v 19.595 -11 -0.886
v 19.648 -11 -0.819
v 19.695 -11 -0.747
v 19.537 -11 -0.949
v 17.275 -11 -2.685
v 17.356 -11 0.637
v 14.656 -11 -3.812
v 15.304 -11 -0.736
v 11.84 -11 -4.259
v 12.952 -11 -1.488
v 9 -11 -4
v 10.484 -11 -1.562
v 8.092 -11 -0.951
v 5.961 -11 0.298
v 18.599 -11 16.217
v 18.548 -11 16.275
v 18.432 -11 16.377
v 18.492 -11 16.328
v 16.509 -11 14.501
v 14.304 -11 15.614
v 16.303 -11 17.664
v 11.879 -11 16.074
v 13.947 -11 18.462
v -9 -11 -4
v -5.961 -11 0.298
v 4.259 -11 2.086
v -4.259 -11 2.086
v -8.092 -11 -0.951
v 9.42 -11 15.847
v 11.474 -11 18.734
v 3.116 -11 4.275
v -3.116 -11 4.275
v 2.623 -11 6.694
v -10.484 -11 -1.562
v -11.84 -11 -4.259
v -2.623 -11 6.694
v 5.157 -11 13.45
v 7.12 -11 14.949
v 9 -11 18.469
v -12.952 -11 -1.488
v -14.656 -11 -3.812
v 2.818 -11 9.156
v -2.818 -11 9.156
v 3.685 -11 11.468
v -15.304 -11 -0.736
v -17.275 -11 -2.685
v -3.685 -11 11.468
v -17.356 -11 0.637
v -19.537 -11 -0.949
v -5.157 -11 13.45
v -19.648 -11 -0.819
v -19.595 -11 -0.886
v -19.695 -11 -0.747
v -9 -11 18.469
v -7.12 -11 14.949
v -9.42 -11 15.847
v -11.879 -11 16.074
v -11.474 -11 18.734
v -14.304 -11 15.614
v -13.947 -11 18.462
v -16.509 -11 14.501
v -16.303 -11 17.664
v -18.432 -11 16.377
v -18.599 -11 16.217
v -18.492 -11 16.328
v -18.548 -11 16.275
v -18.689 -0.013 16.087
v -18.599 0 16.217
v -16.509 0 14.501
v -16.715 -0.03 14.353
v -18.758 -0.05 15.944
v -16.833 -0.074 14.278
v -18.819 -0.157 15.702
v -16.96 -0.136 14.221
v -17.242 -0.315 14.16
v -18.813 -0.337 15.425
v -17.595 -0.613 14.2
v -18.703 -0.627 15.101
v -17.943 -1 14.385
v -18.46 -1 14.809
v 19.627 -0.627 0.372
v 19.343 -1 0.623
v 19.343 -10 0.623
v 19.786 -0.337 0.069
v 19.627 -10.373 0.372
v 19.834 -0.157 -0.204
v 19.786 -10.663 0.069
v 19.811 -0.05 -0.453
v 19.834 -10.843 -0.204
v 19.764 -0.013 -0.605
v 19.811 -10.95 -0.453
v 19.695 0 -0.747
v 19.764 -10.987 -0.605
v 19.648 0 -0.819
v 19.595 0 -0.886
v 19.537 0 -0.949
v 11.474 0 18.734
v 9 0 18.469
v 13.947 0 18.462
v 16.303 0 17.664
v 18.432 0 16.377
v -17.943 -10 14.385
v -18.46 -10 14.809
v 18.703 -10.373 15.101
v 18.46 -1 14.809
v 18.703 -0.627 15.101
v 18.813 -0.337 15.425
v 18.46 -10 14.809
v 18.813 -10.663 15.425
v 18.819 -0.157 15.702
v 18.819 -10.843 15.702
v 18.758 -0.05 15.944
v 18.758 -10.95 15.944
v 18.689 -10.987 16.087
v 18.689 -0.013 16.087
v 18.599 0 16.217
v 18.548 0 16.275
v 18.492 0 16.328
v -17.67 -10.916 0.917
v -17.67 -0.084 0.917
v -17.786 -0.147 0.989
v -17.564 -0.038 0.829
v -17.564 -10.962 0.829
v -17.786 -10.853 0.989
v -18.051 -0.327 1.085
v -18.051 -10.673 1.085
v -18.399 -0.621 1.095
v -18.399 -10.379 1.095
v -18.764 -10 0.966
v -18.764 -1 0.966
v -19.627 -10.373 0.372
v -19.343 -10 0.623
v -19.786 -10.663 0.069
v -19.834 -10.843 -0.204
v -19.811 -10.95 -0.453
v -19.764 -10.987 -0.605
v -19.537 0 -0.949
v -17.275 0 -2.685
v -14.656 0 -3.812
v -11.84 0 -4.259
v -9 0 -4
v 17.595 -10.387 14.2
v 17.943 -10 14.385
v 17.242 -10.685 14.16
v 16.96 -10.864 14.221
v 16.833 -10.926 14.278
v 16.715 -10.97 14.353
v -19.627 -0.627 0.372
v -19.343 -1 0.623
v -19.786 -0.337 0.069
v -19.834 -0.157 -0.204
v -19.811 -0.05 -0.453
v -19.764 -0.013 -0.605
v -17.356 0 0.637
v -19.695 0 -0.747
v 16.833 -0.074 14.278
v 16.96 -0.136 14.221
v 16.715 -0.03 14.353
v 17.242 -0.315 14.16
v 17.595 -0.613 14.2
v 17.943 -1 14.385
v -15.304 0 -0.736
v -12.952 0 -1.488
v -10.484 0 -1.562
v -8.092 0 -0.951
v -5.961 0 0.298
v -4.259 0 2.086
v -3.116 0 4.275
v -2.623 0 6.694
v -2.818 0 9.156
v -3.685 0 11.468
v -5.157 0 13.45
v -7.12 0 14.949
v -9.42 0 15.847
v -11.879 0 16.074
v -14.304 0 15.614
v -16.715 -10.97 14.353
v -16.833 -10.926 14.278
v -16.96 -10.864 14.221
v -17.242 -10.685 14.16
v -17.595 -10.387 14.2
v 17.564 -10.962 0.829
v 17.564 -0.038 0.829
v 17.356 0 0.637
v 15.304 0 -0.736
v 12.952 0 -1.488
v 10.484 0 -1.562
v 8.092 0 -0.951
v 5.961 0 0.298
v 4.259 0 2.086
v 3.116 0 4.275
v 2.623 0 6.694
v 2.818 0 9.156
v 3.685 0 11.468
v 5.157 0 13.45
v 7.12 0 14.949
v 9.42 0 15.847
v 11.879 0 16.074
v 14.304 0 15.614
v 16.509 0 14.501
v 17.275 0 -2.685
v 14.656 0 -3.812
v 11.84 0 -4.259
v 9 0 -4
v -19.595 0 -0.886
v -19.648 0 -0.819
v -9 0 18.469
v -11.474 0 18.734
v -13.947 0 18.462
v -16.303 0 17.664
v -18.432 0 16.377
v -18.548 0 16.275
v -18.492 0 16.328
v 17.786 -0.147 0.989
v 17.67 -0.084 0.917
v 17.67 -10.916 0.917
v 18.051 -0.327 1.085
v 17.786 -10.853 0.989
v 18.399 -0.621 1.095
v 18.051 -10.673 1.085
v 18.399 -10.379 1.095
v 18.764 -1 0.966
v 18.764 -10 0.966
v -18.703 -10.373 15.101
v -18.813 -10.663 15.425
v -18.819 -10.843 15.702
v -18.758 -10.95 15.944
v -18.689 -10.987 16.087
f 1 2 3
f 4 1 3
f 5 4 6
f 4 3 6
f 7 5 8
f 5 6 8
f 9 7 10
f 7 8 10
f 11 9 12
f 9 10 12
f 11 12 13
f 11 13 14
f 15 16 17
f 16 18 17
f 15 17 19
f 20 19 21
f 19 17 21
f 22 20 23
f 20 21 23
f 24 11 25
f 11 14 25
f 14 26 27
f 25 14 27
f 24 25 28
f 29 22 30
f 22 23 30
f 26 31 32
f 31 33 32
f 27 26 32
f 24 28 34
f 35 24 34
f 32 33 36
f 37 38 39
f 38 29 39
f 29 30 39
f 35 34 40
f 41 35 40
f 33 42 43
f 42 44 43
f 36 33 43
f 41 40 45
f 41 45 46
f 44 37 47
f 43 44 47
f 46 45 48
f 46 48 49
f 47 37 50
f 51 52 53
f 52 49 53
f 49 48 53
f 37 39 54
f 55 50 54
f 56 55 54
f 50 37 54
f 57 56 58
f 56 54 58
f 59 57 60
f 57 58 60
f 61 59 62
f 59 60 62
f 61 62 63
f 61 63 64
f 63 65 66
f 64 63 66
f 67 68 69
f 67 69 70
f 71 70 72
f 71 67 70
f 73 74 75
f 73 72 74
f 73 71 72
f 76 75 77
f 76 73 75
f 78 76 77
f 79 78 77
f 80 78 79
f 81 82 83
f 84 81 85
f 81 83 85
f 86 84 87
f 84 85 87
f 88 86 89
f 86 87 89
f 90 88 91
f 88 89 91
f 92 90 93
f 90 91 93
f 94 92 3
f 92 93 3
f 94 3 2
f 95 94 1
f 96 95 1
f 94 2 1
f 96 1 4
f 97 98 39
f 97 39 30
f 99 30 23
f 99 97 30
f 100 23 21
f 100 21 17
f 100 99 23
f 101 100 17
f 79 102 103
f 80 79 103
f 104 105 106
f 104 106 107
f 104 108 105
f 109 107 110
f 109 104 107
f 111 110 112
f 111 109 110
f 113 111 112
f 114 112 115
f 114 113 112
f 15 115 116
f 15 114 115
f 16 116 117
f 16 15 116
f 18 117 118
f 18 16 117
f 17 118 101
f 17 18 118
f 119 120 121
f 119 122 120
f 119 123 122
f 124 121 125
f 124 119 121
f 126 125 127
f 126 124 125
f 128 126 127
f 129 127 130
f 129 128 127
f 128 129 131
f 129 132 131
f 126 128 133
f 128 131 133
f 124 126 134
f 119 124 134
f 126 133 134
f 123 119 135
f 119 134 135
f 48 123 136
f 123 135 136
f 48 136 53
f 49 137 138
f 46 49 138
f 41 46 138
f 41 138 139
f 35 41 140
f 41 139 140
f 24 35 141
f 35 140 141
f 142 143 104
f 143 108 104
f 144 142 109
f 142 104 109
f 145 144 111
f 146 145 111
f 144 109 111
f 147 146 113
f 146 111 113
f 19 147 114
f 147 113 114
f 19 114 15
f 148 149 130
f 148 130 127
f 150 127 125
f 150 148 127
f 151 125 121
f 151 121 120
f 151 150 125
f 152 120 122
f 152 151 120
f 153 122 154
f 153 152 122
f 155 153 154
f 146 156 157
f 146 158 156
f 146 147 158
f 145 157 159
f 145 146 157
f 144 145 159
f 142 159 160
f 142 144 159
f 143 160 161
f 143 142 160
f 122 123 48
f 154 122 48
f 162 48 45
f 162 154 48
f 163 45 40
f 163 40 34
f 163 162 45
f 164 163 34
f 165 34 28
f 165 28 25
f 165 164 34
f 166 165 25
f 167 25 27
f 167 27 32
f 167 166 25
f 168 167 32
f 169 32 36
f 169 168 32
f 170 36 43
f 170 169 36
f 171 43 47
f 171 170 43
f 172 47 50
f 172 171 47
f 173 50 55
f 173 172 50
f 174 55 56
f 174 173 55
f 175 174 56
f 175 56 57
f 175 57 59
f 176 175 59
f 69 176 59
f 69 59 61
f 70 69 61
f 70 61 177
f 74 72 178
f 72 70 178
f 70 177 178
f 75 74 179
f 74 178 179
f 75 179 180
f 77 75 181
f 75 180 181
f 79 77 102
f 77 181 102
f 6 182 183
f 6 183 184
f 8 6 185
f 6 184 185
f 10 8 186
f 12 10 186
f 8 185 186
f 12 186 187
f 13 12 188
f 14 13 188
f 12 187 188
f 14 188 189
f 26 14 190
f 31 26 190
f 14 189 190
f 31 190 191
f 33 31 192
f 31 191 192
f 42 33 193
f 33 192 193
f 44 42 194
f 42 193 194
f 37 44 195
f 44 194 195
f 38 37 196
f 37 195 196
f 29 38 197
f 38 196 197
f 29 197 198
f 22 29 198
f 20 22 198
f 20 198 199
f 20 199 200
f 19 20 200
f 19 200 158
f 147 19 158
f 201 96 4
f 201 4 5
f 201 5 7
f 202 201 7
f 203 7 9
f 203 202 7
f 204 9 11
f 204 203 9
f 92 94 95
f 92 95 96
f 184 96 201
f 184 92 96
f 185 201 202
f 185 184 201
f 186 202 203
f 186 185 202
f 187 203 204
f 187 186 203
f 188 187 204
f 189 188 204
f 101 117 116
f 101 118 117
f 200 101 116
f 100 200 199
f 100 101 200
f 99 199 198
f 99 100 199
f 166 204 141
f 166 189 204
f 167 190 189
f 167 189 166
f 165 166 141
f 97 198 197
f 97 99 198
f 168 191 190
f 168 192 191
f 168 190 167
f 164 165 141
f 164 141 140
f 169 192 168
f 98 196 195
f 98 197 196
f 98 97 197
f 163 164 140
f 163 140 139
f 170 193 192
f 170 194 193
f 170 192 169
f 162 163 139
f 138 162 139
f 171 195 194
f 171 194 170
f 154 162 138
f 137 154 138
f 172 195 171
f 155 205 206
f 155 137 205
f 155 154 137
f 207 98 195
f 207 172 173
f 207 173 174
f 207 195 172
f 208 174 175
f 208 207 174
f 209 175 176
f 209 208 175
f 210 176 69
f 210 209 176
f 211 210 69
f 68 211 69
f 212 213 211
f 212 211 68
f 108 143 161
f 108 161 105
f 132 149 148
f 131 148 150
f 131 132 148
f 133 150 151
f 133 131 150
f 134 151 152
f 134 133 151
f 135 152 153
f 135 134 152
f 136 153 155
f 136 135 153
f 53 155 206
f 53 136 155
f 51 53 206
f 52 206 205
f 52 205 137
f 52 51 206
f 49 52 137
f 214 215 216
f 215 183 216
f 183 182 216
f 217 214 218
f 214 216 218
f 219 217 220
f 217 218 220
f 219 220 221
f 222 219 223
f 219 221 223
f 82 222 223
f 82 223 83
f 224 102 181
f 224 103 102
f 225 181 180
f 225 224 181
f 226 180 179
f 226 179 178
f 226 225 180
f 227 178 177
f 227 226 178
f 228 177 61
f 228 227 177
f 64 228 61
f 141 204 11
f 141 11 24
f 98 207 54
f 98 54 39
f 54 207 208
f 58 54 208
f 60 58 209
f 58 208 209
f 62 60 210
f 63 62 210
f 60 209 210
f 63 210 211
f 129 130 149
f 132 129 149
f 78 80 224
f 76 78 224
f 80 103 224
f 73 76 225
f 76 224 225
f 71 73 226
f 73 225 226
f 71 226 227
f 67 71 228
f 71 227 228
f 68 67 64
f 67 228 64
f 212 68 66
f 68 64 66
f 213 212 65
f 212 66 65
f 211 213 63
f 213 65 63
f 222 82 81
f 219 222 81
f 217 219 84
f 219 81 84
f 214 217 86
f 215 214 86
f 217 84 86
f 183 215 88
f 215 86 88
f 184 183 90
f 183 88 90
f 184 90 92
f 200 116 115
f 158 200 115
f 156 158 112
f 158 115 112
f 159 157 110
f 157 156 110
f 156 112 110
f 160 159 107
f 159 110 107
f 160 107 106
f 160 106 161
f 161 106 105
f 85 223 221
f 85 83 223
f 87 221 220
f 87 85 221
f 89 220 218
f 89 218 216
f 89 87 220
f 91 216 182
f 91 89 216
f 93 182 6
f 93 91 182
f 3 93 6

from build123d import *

# Parameters (mm, degrees)
PAD_DEPTH   = 11
FILLET_R    = 1
FILLET001_R = 1


with BuildPart() as part:
    # Sketch → Pad (new body)
    with BuildSketch(Plane.XZ):
        with BuildLine():
            Line((0, 0), (0, 18.468932))
            Line((0, 18.468932), (-9, 18.468932))
            ThreePointArc((-9, 18.468932), (-14.55271, 18.309956), (-19.383095, 15.566739))
            Line((-17.314404, 13.868706), (-19.383095, 15.566739))
            ThreePointArc((-18.083851, 1.368706), (-2.623704, 6.690727), (-17.314404, 13.868706))
            Line((-18.083851, 1.368706), (-20.396363, 0))
            ThreePointArc((-20.396363, 0), (-15.265575, -3.616554), (-9, -4))
            Line((-9, -4), (0, -4))
            Line((0, 0), (0, -4))
        make_face()
    extrude(amount=PAD_DEPTH)

    # Fillet
    fillet_edges = [part.edges().sort_by_distance(p)[0] for p in [
        (-18.083851, -5.5, 1.368706),
        (-20.396363, -5.5, 0),
        (-19.240107, 0, 0.684353),
        (-19.240107, -11, 0.684353),
    ]]
    fillet(fillet_edges, radius=FILLET_R)

    # Fillet001
    fillet001_edges = [part.edges().sort_by_distance(p)[0] for p in [
        (-17.314404, -5.5, 13.868706),
        (-19.383095, -5.5, 15.566739),
        (-18.348749, 0, 14.717723),
        (-18.348749, -11, 14.717723),
    ]]
    fillet(fillet001_edges, radius=FILLET001_R)

    # Mirrored: part across YZ


with BuildPart() as part_1:
    add(part.part)
    add(part.part.mirror(Plane.YZ))


solid = part_1.part
